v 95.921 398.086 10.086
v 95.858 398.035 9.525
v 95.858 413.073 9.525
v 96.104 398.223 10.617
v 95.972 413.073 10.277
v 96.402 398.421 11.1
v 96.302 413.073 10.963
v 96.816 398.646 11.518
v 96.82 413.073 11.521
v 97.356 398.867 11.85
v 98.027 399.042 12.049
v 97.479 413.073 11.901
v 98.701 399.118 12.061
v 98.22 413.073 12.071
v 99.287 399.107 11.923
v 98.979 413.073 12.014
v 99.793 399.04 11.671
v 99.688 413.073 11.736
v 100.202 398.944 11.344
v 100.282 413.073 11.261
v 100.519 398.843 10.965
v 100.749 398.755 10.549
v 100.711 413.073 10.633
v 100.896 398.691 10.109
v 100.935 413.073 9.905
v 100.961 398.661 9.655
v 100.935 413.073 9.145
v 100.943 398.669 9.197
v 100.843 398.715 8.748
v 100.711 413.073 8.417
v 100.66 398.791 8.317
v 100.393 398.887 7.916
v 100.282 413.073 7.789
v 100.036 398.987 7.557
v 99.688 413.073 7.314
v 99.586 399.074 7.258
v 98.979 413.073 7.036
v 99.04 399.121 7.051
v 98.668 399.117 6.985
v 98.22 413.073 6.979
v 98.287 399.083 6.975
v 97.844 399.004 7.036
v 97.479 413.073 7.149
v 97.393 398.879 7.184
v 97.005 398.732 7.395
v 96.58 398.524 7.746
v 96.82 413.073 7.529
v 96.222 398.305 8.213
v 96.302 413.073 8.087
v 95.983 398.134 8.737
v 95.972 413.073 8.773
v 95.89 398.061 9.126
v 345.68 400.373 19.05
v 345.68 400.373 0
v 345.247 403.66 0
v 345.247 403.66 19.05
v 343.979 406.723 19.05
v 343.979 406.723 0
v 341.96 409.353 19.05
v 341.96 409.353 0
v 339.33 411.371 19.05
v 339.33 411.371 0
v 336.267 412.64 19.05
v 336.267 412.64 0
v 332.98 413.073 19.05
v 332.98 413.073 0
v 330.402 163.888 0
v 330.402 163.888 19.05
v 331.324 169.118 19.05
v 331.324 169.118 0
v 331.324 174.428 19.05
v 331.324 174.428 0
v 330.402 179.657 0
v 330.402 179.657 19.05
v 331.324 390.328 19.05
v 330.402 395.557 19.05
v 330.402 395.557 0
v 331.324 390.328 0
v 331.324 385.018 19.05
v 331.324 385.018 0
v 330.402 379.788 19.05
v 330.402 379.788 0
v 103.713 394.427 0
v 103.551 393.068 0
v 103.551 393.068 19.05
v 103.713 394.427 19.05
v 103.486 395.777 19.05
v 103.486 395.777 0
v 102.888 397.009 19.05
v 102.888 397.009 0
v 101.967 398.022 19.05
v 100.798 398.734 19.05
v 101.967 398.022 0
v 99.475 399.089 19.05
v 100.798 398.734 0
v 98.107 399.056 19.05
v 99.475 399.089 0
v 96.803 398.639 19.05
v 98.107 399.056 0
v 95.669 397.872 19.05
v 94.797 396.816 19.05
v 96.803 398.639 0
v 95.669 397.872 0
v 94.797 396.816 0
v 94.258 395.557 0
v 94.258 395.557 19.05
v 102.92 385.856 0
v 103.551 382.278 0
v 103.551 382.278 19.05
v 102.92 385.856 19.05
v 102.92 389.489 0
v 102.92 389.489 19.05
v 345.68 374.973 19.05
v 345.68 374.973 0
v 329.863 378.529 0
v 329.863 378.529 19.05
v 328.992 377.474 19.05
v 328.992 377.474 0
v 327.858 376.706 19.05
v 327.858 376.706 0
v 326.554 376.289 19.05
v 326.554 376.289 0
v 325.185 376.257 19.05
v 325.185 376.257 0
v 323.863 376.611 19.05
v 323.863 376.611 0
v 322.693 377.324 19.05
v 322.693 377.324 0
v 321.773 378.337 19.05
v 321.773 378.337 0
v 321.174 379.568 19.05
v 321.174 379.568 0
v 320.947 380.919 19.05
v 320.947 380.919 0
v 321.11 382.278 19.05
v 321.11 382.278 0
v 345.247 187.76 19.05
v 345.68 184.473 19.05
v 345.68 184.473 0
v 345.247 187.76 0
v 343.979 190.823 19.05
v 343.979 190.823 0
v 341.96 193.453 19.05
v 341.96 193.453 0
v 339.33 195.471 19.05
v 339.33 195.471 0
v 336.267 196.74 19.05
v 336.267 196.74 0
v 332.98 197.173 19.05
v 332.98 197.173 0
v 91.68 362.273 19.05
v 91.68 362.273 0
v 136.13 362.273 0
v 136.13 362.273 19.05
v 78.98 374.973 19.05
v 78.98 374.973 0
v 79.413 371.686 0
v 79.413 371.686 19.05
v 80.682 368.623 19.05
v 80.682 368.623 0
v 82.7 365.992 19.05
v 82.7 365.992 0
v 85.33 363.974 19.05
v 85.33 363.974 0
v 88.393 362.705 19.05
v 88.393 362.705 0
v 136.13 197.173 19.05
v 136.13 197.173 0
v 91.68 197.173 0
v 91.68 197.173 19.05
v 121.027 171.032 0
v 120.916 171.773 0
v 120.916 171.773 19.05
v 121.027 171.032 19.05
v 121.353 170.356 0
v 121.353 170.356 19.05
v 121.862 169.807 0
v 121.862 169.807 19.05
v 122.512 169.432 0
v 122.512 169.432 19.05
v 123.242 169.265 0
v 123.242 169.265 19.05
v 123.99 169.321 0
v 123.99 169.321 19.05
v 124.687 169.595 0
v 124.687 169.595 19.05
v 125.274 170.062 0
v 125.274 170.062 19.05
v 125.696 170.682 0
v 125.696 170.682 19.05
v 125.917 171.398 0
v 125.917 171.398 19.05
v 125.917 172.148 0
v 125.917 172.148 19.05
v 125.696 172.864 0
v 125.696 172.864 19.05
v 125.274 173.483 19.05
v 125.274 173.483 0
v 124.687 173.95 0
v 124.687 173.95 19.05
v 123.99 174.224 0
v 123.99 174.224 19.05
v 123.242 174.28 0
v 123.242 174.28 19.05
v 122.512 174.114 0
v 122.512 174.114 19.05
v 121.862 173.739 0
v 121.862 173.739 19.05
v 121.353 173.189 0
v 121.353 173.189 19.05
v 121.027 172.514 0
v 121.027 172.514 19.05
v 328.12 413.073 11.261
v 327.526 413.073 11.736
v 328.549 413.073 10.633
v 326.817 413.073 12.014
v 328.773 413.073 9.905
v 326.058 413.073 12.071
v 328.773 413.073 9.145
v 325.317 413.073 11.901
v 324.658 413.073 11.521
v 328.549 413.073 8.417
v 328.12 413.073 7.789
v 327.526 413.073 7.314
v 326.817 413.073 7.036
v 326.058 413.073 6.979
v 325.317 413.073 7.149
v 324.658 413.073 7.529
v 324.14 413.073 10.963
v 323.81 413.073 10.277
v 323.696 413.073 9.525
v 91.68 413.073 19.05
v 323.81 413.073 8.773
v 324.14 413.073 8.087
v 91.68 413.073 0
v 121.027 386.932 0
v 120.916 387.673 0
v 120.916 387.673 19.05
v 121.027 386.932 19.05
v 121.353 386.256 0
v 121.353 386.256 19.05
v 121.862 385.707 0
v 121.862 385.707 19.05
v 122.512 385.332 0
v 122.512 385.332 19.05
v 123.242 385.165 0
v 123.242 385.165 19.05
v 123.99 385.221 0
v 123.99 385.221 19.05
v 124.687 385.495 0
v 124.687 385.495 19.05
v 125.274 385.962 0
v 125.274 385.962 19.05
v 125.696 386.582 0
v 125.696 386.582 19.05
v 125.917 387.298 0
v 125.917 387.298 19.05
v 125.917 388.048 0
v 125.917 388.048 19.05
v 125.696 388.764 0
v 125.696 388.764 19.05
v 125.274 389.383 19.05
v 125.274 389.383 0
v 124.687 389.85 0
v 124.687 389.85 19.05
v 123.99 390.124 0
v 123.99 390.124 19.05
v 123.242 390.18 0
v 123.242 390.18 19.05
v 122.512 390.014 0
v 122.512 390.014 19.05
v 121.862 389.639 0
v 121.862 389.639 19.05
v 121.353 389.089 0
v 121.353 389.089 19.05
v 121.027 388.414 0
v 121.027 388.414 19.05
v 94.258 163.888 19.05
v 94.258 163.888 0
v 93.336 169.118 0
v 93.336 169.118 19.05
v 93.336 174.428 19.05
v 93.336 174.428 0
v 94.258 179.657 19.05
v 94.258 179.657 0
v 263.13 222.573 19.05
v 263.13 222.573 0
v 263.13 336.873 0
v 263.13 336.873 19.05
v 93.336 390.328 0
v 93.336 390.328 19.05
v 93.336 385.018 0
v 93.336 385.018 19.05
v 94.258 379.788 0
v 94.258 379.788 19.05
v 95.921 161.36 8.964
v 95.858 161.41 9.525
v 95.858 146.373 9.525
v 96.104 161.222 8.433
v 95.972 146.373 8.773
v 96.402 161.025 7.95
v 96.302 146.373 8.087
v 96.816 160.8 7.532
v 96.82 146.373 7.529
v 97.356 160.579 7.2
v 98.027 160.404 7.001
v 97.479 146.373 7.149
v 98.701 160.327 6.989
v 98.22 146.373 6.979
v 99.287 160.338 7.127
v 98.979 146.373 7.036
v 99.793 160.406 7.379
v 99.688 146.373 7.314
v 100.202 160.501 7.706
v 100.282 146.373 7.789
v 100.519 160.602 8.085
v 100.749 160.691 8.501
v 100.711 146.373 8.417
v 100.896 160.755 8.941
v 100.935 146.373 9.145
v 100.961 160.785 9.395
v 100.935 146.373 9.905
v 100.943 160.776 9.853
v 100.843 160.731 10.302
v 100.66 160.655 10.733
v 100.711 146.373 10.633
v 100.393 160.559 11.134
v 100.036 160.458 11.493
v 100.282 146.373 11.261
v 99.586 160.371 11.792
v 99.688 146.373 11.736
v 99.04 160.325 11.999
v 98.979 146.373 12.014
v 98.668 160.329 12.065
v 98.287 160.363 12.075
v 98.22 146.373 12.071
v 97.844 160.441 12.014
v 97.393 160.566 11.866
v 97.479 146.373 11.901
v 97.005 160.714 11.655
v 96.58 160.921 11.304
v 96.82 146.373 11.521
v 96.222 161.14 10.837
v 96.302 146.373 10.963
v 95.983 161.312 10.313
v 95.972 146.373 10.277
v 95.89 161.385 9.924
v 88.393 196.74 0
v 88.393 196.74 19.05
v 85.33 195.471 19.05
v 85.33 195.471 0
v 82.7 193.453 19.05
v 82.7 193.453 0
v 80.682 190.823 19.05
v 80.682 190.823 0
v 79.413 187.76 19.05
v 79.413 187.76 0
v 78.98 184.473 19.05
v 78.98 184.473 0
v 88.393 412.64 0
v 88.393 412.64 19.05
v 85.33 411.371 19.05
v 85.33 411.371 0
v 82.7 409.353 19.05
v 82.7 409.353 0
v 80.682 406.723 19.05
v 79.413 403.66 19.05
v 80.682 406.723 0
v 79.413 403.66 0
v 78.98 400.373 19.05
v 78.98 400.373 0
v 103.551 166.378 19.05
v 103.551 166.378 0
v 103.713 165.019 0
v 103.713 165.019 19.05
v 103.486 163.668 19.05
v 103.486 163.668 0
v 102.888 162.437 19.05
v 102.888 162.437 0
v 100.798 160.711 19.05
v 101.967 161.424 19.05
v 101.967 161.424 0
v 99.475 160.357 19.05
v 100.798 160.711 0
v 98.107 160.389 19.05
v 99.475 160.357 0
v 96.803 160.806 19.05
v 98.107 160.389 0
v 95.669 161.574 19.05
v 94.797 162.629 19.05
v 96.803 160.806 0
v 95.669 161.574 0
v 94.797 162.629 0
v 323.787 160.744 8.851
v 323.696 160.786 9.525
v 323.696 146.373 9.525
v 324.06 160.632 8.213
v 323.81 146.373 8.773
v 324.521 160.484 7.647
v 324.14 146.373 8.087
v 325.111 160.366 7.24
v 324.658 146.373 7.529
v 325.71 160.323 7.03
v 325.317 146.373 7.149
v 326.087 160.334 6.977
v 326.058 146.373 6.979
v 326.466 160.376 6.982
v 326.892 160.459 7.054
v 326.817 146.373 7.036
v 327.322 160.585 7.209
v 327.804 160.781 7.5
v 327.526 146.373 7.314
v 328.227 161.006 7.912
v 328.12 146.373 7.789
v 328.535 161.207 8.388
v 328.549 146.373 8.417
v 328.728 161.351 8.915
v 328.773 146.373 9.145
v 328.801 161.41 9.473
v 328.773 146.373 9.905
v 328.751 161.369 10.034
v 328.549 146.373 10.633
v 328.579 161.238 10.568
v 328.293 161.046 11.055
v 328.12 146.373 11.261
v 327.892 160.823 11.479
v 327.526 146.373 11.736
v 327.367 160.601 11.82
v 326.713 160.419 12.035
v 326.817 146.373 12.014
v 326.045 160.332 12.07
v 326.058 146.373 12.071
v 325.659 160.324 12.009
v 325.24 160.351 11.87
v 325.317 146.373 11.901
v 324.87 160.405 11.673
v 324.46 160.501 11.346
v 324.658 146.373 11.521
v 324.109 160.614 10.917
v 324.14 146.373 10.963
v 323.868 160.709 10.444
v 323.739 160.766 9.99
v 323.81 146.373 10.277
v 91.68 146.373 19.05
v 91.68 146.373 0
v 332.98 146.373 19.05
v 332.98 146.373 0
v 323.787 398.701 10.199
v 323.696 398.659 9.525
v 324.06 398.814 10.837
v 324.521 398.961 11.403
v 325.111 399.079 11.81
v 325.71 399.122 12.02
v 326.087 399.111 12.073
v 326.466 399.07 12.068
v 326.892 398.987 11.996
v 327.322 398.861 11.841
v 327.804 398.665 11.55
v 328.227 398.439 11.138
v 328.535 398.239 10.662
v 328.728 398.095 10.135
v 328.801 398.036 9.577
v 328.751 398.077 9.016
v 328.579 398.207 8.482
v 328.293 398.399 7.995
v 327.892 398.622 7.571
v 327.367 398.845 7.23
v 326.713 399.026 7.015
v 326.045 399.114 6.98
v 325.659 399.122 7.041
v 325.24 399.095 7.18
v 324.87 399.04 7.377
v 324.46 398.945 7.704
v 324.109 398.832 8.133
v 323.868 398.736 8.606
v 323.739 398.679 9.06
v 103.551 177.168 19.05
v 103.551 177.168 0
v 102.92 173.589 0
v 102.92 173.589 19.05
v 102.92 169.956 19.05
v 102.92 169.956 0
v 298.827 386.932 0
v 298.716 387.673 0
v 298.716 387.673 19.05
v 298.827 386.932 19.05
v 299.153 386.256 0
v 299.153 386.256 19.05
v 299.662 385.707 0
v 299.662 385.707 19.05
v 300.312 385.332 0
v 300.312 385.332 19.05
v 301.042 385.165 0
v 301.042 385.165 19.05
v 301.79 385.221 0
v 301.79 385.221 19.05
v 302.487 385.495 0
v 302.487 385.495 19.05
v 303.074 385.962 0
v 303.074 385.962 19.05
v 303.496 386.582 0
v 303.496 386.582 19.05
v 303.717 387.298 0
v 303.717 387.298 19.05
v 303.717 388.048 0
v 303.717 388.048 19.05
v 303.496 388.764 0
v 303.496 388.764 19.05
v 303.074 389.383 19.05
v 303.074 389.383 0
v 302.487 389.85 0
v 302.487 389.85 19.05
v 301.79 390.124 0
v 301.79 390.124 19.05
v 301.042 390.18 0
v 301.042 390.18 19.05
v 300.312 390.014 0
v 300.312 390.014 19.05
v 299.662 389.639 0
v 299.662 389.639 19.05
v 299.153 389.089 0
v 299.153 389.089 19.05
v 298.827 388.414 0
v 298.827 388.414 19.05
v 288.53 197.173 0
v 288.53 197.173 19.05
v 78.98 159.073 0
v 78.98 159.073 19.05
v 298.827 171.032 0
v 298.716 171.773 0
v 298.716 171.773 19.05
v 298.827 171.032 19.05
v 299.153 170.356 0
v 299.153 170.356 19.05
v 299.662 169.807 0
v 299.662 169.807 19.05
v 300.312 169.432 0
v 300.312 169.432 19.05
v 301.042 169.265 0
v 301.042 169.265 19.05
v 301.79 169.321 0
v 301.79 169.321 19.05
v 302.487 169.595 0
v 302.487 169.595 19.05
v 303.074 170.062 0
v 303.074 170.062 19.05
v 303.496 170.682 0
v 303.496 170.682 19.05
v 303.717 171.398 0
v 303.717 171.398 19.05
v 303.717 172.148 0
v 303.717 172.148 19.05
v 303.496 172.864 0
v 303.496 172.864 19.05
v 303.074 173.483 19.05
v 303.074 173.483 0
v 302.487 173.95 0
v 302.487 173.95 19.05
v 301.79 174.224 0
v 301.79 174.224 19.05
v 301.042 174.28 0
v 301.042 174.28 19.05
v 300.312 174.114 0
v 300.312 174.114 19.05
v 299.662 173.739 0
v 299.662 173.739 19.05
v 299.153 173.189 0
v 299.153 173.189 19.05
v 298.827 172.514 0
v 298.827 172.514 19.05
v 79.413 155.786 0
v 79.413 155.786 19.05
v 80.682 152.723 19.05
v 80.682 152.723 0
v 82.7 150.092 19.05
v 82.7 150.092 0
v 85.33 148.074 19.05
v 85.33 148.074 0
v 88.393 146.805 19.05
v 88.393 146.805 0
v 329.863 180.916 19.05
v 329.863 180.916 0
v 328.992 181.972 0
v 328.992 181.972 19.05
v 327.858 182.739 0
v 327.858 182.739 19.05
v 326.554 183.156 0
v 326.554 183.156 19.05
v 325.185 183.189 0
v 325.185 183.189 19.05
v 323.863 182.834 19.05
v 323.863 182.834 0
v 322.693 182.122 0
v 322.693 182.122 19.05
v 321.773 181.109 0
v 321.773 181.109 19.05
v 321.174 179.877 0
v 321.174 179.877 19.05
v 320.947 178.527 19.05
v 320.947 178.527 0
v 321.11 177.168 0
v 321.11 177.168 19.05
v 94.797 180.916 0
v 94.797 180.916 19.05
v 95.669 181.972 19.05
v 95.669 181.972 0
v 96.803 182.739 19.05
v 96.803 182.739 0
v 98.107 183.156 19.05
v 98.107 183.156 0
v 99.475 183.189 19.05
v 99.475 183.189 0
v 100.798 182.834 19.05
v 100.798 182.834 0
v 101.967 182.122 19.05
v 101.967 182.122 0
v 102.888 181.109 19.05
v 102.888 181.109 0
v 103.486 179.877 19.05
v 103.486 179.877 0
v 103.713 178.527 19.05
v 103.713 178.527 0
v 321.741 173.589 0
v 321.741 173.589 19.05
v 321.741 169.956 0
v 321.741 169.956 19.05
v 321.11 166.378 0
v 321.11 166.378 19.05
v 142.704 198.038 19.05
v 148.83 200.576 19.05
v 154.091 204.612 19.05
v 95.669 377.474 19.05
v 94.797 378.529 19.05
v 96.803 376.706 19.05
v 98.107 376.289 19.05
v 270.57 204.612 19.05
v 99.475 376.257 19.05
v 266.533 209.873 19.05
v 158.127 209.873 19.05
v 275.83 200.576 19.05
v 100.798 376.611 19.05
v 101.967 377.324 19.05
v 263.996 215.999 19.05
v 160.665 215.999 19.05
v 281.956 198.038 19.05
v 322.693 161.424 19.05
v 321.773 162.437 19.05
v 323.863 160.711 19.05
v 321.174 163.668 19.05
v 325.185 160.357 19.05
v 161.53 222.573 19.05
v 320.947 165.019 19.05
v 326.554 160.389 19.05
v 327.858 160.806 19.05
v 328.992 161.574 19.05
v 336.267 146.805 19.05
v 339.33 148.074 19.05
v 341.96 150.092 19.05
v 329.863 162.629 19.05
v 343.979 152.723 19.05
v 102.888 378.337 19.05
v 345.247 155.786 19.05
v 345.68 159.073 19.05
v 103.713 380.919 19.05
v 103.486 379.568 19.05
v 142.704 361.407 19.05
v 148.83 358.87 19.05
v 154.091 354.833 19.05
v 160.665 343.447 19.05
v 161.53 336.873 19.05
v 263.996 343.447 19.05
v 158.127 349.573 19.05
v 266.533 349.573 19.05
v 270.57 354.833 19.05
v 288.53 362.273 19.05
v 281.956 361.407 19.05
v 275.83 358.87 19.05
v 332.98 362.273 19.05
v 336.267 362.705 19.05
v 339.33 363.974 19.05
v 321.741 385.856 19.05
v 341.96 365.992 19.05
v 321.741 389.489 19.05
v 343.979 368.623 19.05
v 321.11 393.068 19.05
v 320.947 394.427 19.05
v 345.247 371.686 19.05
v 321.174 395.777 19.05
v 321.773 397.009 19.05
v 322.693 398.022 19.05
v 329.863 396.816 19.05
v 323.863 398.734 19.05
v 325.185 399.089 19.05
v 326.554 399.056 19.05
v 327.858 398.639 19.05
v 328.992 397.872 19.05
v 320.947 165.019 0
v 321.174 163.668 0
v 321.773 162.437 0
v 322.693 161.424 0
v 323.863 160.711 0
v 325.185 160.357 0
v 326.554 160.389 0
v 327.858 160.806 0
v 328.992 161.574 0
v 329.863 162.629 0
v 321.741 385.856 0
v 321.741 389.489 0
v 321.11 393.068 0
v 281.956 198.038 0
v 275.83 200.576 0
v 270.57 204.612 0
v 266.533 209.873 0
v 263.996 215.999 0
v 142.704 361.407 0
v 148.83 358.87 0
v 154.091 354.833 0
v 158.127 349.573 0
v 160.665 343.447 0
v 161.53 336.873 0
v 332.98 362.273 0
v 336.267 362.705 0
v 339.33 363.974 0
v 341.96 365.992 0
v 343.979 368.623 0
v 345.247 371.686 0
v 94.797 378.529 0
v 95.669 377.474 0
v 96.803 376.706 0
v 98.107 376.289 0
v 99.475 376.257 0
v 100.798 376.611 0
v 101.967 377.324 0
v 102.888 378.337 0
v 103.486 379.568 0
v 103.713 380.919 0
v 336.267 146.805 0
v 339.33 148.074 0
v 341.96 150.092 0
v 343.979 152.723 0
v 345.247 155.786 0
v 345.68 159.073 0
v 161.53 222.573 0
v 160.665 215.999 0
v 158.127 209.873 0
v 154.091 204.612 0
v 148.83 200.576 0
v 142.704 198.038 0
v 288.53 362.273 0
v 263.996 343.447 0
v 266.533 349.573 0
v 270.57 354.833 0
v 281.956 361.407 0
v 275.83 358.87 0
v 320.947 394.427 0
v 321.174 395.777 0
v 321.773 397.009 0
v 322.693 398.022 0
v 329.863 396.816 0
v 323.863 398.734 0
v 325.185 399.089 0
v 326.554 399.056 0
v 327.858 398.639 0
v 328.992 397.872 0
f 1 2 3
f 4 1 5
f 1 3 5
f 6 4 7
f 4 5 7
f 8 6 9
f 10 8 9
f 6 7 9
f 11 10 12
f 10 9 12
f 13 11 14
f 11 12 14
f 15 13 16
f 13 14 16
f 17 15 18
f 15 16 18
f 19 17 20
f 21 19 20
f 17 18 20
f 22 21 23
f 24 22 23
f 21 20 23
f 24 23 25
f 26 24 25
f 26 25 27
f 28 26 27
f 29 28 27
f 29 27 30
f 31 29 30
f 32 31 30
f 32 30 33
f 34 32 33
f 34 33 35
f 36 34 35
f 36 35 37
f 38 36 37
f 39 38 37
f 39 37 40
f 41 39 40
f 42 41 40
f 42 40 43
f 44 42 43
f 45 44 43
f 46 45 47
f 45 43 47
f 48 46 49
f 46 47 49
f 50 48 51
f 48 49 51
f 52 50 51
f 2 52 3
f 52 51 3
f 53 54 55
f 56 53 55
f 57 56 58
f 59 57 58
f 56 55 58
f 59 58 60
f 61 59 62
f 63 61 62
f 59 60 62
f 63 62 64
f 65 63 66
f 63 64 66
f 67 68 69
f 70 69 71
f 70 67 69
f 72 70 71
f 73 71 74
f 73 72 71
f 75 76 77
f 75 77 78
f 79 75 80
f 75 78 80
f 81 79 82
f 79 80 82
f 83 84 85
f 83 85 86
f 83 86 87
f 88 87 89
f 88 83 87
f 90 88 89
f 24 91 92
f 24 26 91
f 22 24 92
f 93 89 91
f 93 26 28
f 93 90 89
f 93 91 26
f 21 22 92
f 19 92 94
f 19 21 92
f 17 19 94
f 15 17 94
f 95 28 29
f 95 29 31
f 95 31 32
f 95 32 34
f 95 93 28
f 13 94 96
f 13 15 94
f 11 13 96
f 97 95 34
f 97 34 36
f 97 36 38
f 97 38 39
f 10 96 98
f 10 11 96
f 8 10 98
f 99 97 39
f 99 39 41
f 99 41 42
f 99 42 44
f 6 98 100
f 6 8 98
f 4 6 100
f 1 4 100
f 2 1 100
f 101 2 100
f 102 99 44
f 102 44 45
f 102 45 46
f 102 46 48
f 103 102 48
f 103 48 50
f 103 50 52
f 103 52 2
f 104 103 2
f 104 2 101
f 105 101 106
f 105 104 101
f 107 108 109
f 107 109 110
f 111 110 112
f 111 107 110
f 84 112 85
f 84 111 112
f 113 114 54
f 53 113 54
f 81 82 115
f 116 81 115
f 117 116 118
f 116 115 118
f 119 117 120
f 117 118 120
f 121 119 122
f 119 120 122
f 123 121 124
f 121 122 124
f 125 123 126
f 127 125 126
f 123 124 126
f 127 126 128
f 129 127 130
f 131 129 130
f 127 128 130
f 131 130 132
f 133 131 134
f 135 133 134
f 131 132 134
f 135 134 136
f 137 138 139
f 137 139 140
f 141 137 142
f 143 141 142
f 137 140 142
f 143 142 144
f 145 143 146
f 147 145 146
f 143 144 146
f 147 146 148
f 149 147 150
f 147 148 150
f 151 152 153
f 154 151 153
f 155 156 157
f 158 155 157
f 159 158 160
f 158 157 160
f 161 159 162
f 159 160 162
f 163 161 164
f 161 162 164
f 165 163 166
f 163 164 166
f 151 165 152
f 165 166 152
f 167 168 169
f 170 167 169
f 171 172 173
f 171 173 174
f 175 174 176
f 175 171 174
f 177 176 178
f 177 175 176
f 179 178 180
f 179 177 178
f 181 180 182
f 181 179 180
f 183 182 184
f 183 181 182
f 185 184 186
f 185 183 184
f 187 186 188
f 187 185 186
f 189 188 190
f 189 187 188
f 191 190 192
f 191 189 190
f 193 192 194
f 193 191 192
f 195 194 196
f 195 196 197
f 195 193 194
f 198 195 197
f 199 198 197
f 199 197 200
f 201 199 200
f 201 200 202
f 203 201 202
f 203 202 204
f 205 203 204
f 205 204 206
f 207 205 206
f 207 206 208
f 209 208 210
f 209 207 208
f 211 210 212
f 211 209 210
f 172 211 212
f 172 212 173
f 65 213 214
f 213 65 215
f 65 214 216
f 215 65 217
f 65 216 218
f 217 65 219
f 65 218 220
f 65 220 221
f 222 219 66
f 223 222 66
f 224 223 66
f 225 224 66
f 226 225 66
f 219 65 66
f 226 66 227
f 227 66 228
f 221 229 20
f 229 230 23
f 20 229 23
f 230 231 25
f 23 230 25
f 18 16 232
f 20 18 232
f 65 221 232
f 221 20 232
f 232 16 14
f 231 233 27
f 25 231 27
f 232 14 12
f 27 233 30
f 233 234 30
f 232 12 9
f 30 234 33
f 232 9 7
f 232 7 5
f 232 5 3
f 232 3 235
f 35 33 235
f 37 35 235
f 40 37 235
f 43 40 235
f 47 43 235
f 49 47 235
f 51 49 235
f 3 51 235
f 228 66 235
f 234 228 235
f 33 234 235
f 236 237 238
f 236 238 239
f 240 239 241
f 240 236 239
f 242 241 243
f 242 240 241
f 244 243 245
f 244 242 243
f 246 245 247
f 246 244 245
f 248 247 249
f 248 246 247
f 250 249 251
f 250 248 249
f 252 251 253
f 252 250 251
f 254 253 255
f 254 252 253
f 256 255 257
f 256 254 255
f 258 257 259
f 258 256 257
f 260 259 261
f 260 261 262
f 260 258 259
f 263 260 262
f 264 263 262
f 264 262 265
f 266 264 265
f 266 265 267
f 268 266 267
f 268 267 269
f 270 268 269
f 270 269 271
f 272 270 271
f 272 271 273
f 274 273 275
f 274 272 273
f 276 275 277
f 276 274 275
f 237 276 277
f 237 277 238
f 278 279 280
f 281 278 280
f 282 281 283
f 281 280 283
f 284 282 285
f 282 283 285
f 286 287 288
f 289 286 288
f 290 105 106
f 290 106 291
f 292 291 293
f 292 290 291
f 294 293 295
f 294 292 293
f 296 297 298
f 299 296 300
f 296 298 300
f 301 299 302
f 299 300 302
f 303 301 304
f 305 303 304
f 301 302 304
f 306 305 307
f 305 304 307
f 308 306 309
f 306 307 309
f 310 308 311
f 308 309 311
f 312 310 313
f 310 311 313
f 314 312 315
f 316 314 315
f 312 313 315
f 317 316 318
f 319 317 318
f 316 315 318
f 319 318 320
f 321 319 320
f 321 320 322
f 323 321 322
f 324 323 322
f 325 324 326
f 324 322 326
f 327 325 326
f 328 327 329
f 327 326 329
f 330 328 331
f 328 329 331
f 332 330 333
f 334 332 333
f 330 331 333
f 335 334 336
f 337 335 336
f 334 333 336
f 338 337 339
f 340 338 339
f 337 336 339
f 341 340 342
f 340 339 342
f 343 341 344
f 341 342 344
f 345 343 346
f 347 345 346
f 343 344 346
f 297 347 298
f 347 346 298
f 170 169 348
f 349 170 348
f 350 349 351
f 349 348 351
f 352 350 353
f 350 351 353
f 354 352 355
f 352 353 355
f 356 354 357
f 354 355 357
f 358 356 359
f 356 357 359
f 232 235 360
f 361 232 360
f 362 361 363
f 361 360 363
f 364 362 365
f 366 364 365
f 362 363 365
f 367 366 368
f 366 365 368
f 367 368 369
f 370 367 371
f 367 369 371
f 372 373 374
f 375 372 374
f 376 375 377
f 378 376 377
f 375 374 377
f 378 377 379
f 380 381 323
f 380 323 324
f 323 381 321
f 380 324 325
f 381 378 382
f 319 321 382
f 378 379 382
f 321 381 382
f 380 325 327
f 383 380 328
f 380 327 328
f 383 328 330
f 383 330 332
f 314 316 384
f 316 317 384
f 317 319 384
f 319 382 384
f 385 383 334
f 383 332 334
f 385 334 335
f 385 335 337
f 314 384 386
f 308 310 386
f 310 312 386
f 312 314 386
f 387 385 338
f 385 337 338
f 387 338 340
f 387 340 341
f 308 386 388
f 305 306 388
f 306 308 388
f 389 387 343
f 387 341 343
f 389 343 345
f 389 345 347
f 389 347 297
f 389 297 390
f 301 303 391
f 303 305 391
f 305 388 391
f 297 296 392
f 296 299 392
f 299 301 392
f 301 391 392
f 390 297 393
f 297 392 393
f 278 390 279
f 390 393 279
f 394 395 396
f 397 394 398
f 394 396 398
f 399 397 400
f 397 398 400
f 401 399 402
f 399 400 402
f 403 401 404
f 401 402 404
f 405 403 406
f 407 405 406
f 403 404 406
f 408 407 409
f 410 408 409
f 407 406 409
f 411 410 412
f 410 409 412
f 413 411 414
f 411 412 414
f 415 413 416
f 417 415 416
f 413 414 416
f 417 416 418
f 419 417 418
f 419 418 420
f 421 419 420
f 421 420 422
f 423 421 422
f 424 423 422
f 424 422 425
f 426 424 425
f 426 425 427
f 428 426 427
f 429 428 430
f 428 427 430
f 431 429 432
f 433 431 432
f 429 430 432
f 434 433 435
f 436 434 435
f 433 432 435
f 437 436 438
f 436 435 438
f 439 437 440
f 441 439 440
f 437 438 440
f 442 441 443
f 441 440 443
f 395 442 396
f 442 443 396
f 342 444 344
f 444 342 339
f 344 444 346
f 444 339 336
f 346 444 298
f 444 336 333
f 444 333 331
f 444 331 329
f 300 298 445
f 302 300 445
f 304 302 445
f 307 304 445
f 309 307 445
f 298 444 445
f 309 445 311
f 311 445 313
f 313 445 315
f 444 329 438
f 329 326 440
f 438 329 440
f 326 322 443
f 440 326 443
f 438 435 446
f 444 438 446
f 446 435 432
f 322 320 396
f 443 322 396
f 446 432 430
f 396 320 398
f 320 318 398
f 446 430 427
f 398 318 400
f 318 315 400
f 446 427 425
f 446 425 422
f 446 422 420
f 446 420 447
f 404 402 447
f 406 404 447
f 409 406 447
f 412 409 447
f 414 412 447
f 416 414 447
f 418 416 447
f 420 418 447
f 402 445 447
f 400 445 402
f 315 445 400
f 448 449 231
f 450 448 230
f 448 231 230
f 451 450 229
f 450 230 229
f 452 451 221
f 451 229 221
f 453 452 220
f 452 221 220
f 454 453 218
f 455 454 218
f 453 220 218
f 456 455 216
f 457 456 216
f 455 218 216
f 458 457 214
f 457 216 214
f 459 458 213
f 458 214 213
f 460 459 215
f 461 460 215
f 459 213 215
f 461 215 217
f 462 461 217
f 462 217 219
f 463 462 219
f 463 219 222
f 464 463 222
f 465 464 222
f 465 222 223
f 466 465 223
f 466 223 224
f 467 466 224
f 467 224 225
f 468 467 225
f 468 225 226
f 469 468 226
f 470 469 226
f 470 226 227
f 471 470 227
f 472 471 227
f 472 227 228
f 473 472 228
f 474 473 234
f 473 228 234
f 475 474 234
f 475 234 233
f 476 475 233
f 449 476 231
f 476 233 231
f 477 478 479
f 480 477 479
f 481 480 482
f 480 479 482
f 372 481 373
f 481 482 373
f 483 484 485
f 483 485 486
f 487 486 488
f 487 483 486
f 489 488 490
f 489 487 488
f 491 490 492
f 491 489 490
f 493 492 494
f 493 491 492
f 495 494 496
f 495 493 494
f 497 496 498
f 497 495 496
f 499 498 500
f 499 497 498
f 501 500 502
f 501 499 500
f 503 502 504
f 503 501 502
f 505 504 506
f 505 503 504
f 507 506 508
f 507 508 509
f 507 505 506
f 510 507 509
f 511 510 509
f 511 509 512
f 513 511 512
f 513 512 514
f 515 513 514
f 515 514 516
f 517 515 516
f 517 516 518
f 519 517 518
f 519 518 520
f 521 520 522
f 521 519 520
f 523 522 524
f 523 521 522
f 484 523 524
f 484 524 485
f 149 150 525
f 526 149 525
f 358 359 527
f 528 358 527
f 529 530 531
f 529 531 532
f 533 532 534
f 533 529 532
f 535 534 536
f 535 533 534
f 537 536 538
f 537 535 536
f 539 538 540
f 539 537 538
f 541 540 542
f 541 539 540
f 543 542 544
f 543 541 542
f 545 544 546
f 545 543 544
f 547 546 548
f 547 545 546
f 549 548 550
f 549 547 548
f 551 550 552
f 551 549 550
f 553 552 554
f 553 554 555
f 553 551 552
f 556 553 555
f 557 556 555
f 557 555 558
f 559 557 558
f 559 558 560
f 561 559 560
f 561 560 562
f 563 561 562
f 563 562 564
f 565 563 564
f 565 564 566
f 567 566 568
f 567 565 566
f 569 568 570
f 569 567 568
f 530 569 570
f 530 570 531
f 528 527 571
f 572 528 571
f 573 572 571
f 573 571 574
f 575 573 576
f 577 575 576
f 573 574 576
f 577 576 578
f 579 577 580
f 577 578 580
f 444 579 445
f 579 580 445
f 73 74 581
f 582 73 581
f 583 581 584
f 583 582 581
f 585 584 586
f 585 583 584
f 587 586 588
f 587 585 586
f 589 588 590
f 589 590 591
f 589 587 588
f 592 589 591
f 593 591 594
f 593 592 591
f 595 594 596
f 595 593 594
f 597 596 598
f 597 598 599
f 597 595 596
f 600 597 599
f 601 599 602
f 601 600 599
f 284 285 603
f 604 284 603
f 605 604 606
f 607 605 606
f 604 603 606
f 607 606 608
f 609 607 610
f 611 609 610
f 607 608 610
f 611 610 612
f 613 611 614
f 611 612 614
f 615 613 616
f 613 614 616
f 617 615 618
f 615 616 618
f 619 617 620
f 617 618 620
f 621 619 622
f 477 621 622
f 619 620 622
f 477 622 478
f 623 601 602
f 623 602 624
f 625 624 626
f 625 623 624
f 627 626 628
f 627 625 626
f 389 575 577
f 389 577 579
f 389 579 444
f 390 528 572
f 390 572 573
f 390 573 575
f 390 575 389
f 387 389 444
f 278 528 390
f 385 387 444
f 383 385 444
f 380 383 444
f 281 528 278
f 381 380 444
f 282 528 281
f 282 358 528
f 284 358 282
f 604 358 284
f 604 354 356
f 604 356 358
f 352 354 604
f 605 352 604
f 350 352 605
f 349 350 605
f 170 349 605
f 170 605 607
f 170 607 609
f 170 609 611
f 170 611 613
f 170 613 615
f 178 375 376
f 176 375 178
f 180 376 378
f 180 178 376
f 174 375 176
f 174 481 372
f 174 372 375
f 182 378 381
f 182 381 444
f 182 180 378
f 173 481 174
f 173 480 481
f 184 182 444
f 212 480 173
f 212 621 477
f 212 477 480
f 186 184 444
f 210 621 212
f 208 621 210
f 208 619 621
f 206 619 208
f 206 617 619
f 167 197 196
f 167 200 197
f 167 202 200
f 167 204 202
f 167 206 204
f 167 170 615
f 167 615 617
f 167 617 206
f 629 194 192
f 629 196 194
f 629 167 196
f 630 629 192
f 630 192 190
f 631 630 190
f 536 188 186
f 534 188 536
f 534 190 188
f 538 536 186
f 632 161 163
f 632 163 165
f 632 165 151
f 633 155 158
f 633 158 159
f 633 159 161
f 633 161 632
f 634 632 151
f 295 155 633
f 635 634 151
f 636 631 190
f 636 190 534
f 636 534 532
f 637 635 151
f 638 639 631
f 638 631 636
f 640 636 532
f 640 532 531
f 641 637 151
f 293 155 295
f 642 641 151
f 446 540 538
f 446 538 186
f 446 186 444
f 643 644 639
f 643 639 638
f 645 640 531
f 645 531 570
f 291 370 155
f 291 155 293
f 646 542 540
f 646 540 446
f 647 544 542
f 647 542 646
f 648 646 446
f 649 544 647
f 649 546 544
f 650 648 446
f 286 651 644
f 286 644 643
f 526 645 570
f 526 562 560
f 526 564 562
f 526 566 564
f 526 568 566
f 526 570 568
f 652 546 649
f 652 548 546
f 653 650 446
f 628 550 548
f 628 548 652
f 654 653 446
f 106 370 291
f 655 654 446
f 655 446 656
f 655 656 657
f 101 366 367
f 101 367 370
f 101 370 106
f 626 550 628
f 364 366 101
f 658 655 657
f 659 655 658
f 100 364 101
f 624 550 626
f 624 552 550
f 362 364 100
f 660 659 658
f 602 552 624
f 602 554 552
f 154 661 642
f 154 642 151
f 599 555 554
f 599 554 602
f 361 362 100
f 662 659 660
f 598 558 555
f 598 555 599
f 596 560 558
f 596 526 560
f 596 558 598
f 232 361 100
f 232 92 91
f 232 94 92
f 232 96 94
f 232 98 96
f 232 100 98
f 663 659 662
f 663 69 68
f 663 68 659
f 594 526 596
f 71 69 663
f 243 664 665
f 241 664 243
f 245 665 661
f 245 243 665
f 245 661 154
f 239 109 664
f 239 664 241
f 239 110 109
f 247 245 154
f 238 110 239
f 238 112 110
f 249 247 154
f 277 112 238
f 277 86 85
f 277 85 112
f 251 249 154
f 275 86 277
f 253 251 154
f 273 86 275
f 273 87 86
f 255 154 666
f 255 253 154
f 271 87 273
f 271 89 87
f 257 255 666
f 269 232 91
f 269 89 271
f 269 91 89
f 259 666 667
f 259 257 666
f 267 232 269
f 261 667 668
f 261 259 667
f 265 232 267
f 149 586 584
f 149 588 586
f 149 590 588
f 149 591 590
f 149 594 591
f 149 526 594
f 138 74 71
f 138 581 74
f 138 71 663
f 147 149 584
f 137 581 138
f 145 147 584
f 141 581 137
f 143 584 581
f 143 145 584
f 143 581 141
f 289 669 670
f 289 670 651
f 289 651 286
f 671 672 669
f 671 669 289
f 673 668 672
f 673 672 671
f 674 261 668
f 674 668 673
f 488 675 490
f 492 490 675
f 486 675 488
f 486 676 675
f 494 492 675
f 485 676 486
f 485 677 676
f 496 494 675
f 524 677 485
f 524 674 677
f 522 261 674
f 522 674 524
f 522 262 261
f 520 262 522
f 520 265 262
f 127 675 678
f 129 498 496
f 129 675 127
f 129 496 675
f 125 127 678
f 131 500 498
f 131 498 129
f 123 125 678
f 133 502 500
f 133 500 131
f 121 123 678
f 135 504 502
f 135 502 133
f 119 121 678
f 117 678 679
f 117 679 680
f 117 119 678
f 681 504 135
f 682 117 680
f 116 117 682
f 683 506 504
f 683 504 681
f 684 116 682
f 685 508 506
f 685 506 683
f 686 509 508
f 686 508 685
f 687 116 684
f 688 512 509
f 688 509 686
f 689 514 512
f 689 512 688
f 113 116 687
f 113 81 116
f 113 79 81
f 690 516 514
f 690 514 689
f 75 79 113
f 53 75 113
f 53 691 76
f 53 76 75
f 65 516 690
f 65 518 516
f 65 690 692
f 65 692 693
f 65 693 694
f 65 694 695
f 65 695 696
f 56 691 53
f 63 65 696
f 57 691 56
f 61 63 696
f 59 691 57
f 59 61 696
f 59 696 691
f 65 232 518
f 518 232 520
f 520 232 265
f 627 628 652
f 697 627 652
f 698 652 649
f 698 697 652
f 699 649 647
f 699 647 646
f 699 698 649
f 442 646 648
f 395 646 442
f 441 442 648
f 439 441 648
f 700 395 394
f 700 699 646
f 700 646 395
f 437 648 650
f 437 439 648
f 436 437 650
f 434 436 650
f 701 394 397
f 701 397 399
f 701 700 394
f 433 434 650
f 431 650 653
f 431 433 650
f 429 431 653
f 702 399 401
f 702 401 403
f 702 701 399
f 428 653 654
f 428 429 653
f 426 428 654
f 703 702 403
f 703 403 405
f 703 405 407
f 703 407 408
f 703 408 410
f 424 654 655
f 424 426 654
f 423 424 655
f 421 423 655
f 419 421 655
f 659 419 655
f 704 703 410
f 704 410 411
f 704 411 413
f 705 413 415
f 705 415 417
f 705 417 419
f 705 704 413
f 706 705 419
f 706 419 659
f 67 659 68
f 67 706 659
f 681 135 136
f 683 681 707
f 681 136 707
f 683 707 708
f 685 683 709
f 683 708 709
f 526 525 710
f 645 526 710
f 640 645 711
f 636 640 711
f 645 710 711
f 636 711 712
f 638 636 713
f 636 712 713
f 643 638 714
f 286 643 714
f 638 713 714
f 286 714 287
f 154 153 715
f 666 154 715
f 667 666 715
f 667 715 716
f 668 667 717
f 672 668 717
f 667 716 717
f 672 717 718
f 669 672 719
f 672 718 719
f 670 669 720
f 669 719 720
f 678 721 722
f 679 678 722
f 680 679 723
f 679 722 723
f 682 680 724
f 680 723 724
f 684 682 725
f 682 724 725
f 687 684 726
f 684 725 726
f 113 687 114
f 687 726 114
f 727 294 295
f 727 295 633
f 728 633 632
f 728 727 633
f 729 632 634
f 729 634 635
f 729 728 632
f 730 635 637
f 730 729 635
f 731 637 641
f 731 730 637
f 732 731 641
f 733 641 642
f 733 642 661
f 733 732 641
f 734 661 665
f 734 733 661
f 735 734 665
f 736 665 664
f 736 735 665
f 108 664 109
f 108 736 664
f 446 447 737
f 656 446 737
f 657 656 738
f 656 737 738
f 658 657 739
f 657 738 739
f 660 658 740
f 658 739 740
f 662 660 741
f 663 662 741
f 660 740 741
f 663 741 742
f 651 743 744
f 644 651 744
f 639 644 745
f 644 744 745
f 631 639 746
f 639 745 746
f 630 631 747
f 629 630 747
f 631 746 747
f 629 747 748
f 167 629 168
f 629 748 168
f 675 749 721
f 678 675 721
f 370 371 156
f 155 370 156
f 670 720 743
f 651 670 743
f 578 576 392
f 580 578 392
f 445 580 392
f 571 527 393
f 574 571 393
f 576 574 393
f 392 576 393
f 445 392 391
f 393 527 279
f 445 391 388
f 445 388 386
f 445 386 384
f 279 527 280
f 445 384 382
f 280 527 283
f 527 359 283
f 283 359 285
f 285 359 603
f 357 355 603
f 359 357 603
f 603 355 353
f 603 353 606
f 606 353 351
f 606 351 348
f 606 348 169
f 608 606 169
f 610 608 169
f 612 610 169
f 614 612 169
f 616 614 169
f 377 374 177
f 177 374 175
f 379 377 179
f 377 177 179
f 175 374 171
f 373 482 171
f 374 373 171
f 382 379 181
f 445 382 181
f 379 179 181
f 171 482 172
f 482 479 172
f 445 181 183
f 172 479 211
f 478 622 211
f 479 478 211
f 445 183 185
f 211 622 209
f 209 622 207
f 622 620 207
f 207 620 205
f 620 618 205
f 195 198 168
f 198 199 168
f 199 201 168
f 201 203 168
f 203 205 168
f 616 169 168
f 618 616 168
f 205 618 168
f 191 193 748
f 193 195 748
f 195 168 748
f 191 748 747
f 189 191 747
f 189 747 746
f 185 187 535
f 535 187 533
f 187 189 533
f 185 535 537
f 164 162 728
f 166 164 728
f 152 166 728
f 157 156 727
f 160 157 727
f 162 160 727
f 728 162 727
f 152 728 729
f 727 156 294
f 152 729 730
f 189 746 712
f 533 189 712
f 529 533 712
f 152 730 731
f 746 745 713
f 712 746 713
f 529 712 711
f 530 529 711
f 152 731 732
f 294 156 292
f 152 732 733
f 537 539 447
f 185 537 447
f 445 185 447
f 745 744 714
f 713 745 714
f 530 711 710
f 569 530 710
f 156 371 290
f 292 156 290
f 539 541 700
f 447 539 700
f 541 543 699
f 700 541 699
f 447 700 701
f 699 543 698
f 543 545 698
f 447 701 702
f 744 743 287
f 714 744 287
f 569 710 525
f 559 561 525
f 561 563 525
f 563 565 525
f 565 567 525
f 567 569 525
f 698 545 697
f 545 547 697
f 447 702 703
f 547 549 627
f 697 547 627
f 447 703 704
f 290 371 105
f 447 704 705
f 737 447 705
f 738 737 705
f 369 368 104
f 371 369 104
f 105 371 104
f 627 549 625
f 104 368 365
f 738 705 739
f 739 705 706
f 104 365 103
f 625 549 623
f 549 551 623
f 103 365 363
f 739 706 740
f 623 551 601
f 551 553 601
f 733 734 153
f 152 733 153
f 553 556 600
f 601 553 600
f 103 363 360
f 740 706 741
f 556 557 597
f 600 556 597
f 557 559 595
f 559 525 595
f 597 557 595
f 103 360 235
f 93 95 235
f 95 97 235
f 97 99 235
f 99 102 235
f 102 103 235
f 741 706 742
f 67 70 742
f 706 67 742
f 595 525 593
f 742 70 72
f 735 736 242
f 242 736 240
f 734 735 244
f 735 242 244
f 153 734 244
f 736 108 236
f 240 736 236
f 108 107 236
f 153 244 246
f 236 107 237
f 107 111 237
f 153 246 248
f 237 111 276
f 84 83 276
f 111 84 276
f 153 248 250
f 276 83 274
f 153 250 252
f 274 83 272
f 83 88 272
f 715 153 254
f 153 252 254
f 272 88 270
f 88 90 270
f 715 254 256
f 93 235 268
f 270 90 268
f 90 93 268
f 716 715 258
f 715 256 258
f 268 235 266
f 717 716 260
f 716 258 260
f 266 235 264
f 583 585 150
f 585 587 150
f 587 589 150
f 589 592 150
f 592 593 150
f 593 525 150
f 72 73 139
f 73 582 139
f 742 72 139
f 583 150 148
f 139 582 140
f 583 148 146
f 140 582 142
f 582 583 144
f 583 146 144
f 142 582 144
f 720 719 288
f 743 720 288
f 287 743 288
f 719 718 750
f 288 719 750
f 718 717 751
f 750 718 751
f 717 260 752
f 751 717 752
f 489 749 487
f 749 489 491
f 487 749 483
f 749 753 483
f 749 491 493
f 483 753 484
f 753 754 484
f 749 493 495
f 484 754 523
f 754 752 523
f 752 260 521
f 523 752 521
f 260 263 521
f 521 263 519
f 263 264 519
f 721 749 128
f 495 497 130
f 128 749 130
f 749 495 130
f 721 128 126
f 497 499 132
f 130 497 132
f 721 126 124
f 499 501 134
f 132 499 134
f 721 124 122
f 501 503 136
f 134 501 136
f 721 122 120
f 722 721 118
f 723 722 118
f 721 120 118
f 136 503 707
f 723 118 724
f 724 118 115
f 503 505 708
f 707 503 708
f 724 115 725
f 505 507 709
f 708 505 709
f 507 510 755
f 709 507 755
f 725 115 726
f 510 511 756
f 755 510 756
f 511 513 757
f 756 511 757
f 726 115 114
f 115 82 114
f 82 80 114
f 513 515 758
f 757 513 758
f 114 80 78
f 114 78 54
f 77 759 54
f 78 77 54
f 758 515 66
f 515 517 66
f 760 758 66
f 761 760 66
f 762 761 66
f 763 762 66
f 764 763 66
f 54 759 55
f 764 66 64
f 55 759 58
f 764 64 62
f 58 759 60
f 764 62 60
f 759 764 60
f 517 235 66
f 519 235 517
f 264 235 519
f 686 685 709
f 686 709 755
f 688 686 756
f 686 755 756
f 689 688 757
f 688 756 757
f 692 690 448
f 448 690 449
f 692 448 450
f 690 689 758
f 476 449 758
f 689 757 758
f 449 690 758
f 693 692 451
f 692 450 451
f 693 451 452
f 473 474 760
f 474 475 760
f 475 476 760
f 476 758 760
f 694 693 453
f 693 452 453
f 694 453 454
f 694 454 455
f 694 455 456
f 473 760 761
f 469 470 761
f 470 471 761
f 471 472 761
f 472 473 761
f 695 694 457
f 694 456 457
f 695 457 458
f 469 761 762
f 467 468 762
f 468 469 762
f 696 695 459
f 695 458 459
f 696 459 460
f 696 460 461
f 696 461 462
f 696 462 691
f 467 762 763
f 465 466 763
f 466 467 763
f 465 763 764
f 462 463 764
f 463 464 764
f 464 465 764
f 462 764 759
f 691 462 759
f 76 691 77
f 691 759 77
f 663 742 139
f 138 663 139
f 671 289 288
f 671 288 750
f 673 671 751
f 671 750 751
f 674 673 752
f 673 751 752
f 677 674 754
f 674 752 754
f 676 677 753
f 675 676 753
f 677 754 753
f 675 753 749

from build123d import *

# Parameters (mm, degrees)
MODEL_R             = 2.5146
BOSS_EXTRUDE1_DEPTH = 19.05
CUT_EXTRUDE1_REACH  = 439.02
SKETCH2_R           = 2.5527
CUT_EXTRUDE2_REACH  = 439.02
SKETCH3_R           = 2.5527


with BuildPart() as part:
    # Model → Boss-Extrude1 (new body)
    with BuildSketch(Plane.XY):
        with BuildLine():
            Line((332.980192528, 413.072749717), (91.680192525, 413.072749717))
            ThreePointArc((91.680192525, 413.072749717), (82.699936404, 409.353005838), (78.980192525, 400.372749717))
            Line((78.980192525, 400.372749717), (78.980192525, 374.972749717))
            ThreePointArc((78.980192525, 374.972749717), (82.699936404, 365.992493596), (91.680192525, 362.272749717))
            Line((91.680192525, 362.272749717), (136.130192525, 362.272749717))
            ThreePointArc((136.130192525, 362.272749717), (154.090704768, 354.833261959), (161.530192525, 336.872749717))
            Line((161.530192525, 336.872749717), (161.530192525, 222.572749717))
            ThreePointArc((161.530192525, 222.572749717), (154.090704768, 204.612237475), (136.130192525, 197.172749717))
            Line((136.130192525, 197.172749717), (91.680192525, 197.172749717))
            ThreePointArc((91.680192525, 197.172749717), (82.699936404, 193.453005838), (78.980192525, 184.472749717))
            Line((78.980192525, 184.472749717), (78.980192525, 159.072749717))
            ThreePointArc((78.980192525, 159.072749717), (82.699936404, 150.092493596), (91.680192525, 146.372749717))
            Line((91.680192525, 146.372749717), (332.980192528, 146.372749717))
            ThreePointArc((332.980192528, 146.372749717), (341.960448649, 150.092493596), (345.680192528, 159.072749717))
            Line((345.680192528, 159.072749717), (345.680192528, 184.472749717))
            ThreePointArc((345.680192528, 184.472749717), (341.960448648, 193.453005839), (332.980192525, 197.172749717))
            Line((332.980192525, 197.172749717), (288.530192525, 197.172749717))
            ThreePointArc((288.530192525, 197.172749717), (270.569680283, 204.612237475), (263.130192525, 222.572749717))
            Line((263.130192525, 222.572749717), (263.130192525, 336.872749717))
            ThreePointArc((263.130192525, 336.872749717), (270.569680284, 354.83326196), (288.530192528, 362.272749717))
            Line((288.530192528, 362.272749717), (332.980192528, 362.272749717))
            ThreePointArc((332.980192528, 362.272749717), (341.960448649, 365.992493596), (345.680192528, 374.972749717))
            Line((345.680192528, 374.972749717), (345.680192528, 400.372749717))
            ThreePointArc((345.680192528, 400.372749717), (341.960448649, 409.353005838), (332.980192528, 413.072749717))
        make_face()
        with Locations(Location((123.430192525, 387.672749717, 0), (0, 0, 180))):
            Circle(MODEL_R, mode=Mode.SUBTRACT)
        with Locations(Location((301.230192525, 387.672749717, 0), (0, 0, 180))):
            Circle(MODEL_R, mode=Mode.SUBTRACT)
        with Locations(Location((123.430192525, 171.772749717, 0), (0, 0, 180))):
            Circle(MODEL_R, mode=Mode.SUBTRACT)
        with Locations(Location((301.230192525, 171.772749717, 0), (0, 0, 180))):
            Circle(MODEL_R, mode=Mode.SUBTRACT)
        with BuildLine():
            ThreePointArc((330.402277638, 163.888053974), (331.440317525, 171.772749717), (330.402277638, 179.657445459))
            ThreePointArc((330.402277638, 179.657445459), (324.511101714, 183.058717465), (321.109829708, 177.167541541))
            ThreePointArc((321.109829708, 177.167541541), (321.820067525, 171.772749717), (321.109829708, 166.377957893))
            ThreePointArc((321.109829708, 166.377957893), (324.511101714, 160.486781969), (330.402277638, 163.888053974))
        make_face(mode=Mode.SUBTRACT)
        with BuildLine():
            ThreePointArc((103.550555343, 177.167541541), (102.840317525, 171.772749717), (103.550555343, 166.377957893))
            ThreePointArc((103.550555343, 166.377957893), (100.149283337, 160.486781969), (94.258107413, 163.888053974))
            ThreePointArc((94.258107413, 163.888053974), (93.220067525, 171.772749717), (94.258107413, 179.657445459))
            ThreePointArc((94.258107413, 179.657445459), (100.149283337, 183.058717465), (103.550555343, 177.167541541))
        make_face(mode=Mode.SUBTRACT)
        with BuildLine():
            ThreePointArc((321.109829708, 382.277957893), (321.820067525, 387.672749717), (321.109829708, 393.067541541))
            ThreePointArc((321.109829708, 393.067541541), (324.511101714, 398.958717465), (330.402277638, 395.557445459))
            ThreePointArc((330.402277638, 395.557445459), (331.440317525, 387.672749717), (330.402277638, 379.788053974))
            ThreePointArc((330.402277638, 379.788053974), (324.511101714, 376.386781969), (321.109829708, 382.277957893))
        make_face(mode=Mode.SUBTRACT)
        with BuildLine():
            ThreePointArc((94.258107413, 395.557445459), (93.220067525, 387.672749717), (94.258107413, 379.788053974))
            ThreePointArc((94.258107413, 379.788053974), (100.149283337, 376.386781969), (103.550555343, 382.277957893))
            ThreePointArc((103.550555343, 382.277957893), (102.840317525, 387.672749717), (103.550555343, 393.067541541))
            ThreePointArc((103.550555343, 393.067541541), (100.149283337, 398.958717465), (94.258107413, 395.557445459))
        make_face(mode=Mode.SUBTRACT)
    extrude(amount=BOSS_EXTRUDE1_DEPTH)

    # Sketch2 → Cut-Extrude1 (cut, up to next)
    with BuildSketch(Plane(origin=(0, 413.072749717, 0), x_dir=(1, 0, 0), z_dir=(0, 1, 0)), mode=Mode.PRIVATE) as cut_extrude1_sk1:
        with Locations(Location((98.411192525, -9.525, 0), (0, 0, 180))):
            Circle(SKETCH2_R)
    cut_extrude1_tool1 = extrude(cut_extrude1_sk1.sketch, amount=-CUT_EXTRUDE1_REACH, mode=Mode.PRIVATE) & part.part
    # Sketch2 → Cut-Extrude1 (cut, up to next)
    with BuildSketch(Plane(origin=(0, 413.072749717, 0), x_dir=(1, 0, 0), z_dir=(0, 1, 0)), mode=Mode.PRIVATE) as cut_extrude1_sk2:
        with Locations(Location((326.249192528, -9.525, 0), (0, 0, 180))):
            Circle(SKETCH2_R)
    cut_extrude1_tool2 = extrude(cut_extrude1_sk2.sketch, amount=-CUT_EXTRUDE1_REACH, mode=Mode.PRIVATE) & part.part
    add(cut_extrude1_tool1.solids().sort_by_distance((98.411193, 413.07275, 9.525))[0], mode=Mode.SUBTRACT)
    add(cut_extrude1_tool2.solids().sort_by_distance((326.249193, 413.07275, 9.525))[0], mode=Mode.SUBTRACT)

    # Sketch3 → Cut-Extrude2 (cut, up to next)
    with BuildSketch(Plane.XZ.offset(-146.372749717), mode=Mode.PRIVATE) as cut_extrude2_sk1:
        with Locations(Location((98.411192525, 9.525, 0), (0, 0, 180))):
            Circle(SKETCH3_R)
    cut_extrude2_tool1 = extrude(cut_extrude2_sk1.sketch, amount=-CUT_EXTRUDE2_REACH, mode=Mode.PRIVATE) & part.part
    # Sketch3 → Cut-Extrude2 (cut, up to next)
    with BuildSketch(Plane.XZ.offset(-146.372749717), mode=Mode.PRIVATE) as cut_extrude2_sk2:
        with Locations(Location((326.249192528, 9.525, 0), (0, 0, 180))):
            Circle(SKETCH3_R)
    cut_extrude2_tool2 = extrude(cut_extrude2_sk2.sketch, amount=-CUT_EXTRUDE2_REACH, mode=Mode.PRIVATE) & part.part
    add(cut_extrude2_tool1.solids().sort_by_distance((98.411193, 146.37275, 9.525))[0], mode=Mode.SUBTRACT)
    add(cut_extrude2_tool2.solids().sort_by_distance((326.249193, 146.37275, 9.525))[0], mode=Mode.SUBTRACT)


solid = part.part
